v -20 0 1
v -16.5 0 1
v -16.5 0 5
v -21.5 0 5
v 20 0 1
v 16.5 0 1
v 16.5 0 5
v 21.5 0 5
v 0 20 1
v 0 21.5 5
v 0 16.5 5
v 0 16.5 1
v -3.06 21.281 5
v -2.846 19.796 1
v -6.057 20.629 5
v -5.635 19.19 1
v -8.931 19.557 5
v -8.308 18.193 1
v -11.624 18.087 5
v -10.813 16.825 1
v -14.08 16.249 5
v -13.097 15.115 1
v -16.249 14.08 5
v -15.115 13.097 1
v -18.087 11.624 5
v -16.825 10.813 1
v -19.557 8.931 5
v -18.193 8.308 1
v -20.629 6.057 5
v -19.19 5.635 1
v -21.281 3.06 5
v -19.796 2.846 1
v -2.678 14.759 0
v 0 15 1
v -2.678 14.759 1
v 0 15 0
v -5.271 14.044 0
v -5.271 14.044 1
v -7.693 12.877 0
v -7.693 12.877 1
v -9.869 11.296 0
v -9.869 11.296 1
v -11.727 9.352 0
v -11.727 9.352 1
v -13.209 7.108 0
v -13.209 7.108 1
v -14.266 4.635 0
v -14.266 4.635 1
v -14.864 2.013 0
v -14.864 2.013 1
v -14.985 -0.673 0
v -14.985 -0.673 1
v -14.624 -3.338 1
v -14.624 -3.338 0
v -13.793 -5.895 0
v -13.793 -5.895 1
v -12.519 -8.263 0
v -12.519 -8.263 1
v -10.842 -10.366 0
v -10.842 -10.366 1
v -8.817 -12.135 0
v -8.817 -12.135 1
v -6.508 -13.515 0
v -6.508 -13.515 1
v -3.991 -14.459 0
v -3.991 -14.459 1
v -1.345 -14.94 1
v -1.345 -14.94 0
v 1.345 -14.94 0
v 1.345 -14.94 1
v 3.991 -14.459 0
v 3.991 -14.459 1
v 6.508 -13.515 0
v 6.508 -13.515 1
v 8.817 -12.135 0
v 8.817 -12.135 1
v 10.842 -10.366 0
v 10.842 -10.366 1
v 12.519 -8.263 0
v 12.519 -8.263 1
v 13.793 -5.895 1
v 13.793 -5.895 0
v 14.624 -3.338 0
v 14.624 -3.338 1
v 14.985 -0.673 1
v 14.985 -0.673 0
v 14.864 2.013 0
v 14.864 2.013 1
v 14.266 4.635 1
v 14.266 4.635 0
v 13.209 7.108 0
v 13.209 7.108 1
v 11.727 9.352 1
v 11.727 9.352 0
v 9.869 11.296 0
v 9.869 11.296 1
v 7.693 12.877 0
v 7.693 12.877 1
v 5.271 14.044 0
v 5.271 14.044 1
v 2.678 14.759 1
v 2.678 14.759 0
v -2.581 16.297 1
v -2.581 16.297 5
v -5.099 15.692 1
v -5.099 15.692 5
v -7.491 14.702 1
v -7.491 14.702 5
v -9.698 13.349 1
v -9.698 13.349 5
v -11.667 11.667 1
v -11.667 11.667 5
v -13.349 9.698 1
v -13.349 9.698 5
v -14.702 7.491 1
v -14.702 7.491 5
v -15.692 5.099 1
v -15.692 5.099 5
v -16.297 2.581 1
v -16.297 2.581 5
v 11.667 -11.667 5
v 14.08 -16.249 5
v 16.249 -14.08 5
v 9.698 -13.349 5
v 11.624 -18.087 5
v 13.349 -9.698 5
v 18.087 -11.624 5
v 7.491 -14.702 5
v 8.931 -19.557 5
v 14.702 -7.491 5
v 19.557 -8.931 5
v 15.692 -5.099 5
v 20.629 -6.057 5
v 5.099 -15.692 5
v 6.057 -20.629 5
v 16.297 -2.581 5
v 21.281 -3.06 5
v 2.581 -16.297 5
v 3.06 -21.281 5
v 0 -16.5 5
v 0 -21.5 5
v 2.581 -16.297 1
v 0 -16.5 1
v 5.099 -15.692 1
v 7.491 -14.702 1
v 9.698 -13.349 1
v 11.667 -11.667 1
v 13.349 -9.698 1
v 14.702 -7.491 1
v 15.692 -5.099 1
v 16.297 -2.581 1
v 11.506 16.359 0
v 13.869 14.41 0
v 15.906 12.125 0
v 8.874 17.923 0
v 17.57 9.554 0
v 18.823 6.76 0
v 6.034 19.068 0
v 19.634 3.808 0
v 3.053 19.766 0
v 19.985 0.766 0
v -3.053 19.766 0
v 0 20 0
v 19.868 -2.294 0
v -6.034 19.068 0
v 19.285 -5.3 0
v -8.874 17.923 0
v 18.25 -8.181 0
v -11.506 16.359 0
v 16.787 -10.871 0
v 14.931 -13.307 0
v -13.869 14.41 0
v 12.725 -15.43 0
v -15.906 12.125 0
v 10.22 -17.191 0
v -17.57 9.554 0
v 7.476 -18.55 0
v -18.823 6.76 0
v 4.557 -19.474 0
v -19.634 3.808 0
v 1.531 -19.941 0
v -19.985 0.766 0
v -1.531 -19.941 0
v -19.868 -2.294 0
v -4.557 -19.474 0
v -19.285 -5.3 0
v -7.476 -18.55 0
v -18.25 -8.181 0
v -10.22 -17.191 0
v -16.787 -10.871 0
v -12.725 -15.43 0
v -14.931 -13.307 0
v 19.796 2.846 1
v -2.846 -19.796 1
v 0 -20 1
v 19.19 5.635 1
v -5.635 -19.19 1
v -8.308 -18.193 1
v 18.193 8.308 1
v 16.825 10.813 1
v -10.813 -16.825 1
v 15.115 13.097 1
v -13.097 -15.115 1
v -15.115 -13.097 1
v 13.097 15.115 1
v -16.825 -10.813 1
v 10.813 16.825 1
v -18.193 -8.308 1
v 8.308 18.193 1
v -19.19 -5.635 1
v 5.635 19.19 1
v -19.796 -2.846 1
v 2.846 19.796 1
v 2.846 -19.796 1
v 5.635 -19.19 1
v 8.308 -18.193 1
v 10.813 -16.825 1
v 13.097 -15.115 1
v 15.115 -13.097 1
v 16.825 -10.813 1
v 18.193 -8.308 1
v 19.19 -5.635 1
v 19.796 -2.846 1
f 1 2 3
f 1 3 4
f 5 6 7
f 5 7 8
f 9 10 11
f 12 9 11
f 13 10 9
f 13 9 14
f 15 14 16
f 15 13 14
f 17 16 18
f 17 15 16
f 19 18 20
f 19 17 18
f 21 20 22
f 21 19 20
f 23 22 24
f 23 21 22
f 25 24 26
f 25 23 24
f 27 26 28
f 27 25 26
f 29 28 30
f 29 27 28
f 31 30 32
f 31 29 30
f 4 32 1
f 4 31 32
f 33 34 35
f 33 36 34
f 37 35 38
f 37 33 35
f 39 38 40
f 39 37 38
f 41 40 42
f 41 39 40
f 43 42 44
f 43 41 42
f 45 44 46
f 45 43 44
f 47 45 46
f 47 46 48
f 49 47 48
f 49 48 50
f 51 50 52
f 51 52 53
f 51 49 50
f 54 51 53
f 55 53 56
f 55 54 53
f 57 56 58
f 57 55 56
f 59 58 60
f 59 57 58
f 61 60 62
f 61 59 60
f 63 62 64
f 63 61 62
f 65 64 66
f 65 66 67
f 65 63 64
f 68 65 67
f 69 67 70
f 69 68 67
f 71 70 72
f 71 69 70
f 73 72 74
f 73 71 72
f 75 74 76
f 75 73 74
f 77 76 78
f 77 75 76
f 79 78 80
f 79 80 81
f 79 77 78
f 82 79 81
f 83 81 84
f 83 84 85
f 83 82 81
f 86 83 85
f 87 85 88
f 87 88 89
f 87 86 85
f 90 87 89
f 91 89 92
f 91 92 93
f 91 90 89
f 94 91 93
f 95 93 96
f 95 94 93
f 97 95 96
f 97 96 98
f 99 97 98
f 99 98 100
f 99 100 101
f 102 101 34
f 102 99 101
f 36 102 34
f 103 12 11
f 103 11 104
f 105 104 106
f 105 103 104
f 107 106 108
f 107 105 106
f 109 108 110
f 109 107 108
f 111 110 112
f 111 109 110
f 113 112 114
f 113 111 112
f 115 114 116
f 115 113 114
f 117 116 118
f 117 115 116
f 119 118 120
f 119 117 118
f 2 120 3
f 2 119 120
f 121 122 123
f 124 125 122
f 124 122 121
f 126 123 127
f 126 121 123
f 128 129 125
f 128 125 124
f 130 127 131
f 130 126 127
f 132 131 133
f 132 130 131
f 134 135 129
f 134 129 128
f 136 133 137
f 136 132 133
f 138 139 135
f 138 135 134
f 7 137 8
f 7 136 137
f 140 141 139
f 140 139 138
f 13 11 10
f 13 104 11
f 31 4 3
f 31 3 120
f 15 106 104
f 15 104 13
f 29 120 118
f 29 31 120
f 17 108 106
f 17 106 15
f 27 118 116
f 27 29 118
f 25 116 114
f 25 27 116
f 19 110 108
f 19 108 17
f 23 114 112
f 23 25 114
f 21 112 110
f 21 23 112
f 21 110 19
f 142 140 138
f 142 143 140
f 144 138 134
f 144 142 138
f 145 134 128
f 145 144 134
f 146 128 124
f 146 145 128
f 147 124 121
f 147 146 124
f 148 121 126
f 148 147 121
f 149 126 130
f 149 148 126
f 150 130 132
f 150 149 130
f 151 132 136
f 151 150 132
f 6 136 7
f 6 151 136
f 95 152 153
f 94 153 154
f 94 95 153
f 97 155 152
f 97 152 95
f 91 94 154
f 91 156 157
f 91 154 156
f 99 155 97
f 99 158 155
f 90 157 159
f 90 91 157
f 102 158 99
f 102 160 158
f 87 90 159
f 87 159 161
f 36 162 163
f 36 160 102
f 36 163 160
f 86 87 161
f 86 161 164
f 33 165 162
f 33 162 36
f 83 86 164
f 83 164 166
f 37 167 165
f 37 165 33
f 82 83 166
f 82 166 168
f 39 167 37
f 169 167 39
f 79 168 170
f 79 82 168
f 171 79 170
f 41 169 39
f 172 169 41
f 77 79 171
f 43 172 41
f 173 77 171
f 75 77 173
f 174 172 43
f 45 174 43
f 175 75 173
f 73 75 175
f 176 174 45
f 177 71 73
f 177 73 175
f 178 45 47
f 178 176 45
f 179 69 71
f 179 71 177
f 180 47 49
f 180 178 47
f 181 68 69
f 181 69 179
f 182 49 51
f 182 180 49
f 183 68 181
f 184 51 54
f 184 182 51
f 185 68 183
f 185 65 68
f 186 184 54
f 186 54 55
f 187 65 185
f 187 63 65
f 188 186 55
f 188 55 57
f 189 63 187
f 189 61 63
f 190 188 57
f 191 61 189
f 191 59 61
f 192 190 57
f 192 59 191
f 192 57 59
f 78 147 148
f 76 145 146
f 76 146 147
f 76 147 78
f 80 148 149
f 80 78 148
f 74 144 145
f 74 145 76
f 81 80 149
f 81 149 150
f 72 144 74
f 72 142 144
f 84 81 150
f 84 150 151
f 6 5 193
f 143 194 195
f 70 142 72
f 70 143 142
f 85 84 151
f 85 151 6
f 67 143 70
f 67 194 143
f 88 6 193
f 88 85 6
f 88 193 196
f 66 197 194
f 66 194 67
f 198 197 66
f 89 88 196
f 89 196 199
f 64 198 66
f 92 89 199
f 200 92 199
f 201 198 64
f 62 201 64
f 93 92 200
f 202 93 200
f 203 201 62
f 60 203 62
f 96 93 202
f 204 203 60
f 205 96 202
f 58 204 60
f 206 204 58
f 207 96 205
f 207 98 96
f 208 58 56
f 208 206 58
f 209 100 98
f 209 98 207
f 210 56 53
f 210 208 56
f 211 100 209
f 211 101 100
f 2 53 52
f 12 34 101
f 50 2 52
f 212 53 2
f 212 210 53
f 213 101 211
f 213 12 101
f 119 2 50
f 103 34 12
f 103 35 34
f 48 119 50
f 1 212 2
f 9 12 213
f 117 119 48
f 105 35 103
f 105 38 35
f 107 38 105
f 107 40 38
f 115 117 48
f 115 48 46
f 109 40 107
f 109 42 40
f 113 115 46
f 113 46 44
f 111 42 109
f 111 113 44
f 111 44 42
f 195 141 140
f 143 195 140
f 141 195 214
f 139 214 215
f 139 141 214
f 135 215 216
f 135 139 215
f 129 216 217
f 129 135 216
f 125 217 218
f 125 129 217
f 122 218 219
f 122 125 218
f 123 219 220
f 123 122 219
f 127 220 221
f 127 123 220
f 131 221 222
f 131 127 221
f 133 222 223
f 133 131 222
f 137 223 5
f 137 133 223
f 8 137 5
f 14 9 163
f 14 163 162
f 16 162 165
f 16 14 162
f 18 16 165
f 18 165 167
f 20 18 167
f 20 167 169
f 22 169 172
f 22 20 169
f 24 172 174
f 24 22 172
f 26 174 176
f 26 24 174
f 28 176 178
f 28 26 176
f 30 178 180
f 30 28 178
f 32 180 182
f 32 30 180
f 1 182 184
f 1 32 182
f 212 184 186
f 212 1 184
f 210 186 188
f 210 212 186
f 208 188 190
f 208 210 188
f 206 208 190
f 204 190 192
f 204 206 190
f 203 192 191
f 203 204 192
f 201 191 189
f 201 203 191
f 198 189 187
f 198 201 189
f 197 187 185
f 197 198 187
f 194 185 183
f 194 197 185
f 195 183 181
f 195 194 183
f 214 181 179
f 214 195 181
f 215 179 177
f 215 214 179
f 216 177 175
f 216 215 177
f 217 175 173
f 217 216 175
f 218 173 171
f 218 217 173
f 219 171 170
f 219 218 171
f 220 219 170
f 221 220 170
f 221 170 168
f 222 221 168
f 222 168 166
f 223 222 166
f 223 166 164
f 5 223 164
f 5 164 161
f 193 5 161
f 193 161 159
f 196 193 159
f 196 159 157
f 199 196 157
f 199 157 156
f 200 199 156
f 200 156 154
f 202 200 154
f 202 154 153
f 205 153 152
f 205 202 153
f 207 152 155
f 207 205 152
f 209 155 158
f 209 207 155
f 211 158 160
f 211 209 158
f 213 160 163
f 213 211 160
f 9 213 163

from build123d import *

# Parameters (mm, degrees)
F3_DEPTH = 4


with BuildPart() as f1:
    # F0 (on Right) → F1 (revolve)
    with BuildSketch(Plane.YZ):
        Polygon((15, 1), (15, 0), (20, 0), (20, 1), (21.5, 5), (16.5, 5), (16.5, 1), align=None)
    revolve(axis=Axis((0, 0, -1.199019), (0, 0, 1)))

    # F2 (on face) → F3 (cut)
    with BuildSketch(Plane.XY.offset(5)):
        with BuildLine():
            Line((0, -21.5), (0, -16.5))
            ThreePointArc((0, -16.5), (-11.667262, -11.667262), (-16.5, 0))
            Line((-16.5, 0), (-21.5, 0))
            ThreePointArc((-21.5, 0), (-15.202796, -15.202796), (0, -21.5))
        make_face()
        with BuildLine():
            Line((0, 21.5), (0, 16.5))
            ThreePointArc((0, 16.5), (11.667262, 11.667262), (16.5, 0))
            Line((16.5, 0), (21.5, 0))
            ThreePointArc((21.5, 0), (15.202796, 15.202796), (0, 21.5))
        make_face()
    extrude(amount=-F3_DEPTH, mode=Mode.SUBTRACT)


solid = f1.part
